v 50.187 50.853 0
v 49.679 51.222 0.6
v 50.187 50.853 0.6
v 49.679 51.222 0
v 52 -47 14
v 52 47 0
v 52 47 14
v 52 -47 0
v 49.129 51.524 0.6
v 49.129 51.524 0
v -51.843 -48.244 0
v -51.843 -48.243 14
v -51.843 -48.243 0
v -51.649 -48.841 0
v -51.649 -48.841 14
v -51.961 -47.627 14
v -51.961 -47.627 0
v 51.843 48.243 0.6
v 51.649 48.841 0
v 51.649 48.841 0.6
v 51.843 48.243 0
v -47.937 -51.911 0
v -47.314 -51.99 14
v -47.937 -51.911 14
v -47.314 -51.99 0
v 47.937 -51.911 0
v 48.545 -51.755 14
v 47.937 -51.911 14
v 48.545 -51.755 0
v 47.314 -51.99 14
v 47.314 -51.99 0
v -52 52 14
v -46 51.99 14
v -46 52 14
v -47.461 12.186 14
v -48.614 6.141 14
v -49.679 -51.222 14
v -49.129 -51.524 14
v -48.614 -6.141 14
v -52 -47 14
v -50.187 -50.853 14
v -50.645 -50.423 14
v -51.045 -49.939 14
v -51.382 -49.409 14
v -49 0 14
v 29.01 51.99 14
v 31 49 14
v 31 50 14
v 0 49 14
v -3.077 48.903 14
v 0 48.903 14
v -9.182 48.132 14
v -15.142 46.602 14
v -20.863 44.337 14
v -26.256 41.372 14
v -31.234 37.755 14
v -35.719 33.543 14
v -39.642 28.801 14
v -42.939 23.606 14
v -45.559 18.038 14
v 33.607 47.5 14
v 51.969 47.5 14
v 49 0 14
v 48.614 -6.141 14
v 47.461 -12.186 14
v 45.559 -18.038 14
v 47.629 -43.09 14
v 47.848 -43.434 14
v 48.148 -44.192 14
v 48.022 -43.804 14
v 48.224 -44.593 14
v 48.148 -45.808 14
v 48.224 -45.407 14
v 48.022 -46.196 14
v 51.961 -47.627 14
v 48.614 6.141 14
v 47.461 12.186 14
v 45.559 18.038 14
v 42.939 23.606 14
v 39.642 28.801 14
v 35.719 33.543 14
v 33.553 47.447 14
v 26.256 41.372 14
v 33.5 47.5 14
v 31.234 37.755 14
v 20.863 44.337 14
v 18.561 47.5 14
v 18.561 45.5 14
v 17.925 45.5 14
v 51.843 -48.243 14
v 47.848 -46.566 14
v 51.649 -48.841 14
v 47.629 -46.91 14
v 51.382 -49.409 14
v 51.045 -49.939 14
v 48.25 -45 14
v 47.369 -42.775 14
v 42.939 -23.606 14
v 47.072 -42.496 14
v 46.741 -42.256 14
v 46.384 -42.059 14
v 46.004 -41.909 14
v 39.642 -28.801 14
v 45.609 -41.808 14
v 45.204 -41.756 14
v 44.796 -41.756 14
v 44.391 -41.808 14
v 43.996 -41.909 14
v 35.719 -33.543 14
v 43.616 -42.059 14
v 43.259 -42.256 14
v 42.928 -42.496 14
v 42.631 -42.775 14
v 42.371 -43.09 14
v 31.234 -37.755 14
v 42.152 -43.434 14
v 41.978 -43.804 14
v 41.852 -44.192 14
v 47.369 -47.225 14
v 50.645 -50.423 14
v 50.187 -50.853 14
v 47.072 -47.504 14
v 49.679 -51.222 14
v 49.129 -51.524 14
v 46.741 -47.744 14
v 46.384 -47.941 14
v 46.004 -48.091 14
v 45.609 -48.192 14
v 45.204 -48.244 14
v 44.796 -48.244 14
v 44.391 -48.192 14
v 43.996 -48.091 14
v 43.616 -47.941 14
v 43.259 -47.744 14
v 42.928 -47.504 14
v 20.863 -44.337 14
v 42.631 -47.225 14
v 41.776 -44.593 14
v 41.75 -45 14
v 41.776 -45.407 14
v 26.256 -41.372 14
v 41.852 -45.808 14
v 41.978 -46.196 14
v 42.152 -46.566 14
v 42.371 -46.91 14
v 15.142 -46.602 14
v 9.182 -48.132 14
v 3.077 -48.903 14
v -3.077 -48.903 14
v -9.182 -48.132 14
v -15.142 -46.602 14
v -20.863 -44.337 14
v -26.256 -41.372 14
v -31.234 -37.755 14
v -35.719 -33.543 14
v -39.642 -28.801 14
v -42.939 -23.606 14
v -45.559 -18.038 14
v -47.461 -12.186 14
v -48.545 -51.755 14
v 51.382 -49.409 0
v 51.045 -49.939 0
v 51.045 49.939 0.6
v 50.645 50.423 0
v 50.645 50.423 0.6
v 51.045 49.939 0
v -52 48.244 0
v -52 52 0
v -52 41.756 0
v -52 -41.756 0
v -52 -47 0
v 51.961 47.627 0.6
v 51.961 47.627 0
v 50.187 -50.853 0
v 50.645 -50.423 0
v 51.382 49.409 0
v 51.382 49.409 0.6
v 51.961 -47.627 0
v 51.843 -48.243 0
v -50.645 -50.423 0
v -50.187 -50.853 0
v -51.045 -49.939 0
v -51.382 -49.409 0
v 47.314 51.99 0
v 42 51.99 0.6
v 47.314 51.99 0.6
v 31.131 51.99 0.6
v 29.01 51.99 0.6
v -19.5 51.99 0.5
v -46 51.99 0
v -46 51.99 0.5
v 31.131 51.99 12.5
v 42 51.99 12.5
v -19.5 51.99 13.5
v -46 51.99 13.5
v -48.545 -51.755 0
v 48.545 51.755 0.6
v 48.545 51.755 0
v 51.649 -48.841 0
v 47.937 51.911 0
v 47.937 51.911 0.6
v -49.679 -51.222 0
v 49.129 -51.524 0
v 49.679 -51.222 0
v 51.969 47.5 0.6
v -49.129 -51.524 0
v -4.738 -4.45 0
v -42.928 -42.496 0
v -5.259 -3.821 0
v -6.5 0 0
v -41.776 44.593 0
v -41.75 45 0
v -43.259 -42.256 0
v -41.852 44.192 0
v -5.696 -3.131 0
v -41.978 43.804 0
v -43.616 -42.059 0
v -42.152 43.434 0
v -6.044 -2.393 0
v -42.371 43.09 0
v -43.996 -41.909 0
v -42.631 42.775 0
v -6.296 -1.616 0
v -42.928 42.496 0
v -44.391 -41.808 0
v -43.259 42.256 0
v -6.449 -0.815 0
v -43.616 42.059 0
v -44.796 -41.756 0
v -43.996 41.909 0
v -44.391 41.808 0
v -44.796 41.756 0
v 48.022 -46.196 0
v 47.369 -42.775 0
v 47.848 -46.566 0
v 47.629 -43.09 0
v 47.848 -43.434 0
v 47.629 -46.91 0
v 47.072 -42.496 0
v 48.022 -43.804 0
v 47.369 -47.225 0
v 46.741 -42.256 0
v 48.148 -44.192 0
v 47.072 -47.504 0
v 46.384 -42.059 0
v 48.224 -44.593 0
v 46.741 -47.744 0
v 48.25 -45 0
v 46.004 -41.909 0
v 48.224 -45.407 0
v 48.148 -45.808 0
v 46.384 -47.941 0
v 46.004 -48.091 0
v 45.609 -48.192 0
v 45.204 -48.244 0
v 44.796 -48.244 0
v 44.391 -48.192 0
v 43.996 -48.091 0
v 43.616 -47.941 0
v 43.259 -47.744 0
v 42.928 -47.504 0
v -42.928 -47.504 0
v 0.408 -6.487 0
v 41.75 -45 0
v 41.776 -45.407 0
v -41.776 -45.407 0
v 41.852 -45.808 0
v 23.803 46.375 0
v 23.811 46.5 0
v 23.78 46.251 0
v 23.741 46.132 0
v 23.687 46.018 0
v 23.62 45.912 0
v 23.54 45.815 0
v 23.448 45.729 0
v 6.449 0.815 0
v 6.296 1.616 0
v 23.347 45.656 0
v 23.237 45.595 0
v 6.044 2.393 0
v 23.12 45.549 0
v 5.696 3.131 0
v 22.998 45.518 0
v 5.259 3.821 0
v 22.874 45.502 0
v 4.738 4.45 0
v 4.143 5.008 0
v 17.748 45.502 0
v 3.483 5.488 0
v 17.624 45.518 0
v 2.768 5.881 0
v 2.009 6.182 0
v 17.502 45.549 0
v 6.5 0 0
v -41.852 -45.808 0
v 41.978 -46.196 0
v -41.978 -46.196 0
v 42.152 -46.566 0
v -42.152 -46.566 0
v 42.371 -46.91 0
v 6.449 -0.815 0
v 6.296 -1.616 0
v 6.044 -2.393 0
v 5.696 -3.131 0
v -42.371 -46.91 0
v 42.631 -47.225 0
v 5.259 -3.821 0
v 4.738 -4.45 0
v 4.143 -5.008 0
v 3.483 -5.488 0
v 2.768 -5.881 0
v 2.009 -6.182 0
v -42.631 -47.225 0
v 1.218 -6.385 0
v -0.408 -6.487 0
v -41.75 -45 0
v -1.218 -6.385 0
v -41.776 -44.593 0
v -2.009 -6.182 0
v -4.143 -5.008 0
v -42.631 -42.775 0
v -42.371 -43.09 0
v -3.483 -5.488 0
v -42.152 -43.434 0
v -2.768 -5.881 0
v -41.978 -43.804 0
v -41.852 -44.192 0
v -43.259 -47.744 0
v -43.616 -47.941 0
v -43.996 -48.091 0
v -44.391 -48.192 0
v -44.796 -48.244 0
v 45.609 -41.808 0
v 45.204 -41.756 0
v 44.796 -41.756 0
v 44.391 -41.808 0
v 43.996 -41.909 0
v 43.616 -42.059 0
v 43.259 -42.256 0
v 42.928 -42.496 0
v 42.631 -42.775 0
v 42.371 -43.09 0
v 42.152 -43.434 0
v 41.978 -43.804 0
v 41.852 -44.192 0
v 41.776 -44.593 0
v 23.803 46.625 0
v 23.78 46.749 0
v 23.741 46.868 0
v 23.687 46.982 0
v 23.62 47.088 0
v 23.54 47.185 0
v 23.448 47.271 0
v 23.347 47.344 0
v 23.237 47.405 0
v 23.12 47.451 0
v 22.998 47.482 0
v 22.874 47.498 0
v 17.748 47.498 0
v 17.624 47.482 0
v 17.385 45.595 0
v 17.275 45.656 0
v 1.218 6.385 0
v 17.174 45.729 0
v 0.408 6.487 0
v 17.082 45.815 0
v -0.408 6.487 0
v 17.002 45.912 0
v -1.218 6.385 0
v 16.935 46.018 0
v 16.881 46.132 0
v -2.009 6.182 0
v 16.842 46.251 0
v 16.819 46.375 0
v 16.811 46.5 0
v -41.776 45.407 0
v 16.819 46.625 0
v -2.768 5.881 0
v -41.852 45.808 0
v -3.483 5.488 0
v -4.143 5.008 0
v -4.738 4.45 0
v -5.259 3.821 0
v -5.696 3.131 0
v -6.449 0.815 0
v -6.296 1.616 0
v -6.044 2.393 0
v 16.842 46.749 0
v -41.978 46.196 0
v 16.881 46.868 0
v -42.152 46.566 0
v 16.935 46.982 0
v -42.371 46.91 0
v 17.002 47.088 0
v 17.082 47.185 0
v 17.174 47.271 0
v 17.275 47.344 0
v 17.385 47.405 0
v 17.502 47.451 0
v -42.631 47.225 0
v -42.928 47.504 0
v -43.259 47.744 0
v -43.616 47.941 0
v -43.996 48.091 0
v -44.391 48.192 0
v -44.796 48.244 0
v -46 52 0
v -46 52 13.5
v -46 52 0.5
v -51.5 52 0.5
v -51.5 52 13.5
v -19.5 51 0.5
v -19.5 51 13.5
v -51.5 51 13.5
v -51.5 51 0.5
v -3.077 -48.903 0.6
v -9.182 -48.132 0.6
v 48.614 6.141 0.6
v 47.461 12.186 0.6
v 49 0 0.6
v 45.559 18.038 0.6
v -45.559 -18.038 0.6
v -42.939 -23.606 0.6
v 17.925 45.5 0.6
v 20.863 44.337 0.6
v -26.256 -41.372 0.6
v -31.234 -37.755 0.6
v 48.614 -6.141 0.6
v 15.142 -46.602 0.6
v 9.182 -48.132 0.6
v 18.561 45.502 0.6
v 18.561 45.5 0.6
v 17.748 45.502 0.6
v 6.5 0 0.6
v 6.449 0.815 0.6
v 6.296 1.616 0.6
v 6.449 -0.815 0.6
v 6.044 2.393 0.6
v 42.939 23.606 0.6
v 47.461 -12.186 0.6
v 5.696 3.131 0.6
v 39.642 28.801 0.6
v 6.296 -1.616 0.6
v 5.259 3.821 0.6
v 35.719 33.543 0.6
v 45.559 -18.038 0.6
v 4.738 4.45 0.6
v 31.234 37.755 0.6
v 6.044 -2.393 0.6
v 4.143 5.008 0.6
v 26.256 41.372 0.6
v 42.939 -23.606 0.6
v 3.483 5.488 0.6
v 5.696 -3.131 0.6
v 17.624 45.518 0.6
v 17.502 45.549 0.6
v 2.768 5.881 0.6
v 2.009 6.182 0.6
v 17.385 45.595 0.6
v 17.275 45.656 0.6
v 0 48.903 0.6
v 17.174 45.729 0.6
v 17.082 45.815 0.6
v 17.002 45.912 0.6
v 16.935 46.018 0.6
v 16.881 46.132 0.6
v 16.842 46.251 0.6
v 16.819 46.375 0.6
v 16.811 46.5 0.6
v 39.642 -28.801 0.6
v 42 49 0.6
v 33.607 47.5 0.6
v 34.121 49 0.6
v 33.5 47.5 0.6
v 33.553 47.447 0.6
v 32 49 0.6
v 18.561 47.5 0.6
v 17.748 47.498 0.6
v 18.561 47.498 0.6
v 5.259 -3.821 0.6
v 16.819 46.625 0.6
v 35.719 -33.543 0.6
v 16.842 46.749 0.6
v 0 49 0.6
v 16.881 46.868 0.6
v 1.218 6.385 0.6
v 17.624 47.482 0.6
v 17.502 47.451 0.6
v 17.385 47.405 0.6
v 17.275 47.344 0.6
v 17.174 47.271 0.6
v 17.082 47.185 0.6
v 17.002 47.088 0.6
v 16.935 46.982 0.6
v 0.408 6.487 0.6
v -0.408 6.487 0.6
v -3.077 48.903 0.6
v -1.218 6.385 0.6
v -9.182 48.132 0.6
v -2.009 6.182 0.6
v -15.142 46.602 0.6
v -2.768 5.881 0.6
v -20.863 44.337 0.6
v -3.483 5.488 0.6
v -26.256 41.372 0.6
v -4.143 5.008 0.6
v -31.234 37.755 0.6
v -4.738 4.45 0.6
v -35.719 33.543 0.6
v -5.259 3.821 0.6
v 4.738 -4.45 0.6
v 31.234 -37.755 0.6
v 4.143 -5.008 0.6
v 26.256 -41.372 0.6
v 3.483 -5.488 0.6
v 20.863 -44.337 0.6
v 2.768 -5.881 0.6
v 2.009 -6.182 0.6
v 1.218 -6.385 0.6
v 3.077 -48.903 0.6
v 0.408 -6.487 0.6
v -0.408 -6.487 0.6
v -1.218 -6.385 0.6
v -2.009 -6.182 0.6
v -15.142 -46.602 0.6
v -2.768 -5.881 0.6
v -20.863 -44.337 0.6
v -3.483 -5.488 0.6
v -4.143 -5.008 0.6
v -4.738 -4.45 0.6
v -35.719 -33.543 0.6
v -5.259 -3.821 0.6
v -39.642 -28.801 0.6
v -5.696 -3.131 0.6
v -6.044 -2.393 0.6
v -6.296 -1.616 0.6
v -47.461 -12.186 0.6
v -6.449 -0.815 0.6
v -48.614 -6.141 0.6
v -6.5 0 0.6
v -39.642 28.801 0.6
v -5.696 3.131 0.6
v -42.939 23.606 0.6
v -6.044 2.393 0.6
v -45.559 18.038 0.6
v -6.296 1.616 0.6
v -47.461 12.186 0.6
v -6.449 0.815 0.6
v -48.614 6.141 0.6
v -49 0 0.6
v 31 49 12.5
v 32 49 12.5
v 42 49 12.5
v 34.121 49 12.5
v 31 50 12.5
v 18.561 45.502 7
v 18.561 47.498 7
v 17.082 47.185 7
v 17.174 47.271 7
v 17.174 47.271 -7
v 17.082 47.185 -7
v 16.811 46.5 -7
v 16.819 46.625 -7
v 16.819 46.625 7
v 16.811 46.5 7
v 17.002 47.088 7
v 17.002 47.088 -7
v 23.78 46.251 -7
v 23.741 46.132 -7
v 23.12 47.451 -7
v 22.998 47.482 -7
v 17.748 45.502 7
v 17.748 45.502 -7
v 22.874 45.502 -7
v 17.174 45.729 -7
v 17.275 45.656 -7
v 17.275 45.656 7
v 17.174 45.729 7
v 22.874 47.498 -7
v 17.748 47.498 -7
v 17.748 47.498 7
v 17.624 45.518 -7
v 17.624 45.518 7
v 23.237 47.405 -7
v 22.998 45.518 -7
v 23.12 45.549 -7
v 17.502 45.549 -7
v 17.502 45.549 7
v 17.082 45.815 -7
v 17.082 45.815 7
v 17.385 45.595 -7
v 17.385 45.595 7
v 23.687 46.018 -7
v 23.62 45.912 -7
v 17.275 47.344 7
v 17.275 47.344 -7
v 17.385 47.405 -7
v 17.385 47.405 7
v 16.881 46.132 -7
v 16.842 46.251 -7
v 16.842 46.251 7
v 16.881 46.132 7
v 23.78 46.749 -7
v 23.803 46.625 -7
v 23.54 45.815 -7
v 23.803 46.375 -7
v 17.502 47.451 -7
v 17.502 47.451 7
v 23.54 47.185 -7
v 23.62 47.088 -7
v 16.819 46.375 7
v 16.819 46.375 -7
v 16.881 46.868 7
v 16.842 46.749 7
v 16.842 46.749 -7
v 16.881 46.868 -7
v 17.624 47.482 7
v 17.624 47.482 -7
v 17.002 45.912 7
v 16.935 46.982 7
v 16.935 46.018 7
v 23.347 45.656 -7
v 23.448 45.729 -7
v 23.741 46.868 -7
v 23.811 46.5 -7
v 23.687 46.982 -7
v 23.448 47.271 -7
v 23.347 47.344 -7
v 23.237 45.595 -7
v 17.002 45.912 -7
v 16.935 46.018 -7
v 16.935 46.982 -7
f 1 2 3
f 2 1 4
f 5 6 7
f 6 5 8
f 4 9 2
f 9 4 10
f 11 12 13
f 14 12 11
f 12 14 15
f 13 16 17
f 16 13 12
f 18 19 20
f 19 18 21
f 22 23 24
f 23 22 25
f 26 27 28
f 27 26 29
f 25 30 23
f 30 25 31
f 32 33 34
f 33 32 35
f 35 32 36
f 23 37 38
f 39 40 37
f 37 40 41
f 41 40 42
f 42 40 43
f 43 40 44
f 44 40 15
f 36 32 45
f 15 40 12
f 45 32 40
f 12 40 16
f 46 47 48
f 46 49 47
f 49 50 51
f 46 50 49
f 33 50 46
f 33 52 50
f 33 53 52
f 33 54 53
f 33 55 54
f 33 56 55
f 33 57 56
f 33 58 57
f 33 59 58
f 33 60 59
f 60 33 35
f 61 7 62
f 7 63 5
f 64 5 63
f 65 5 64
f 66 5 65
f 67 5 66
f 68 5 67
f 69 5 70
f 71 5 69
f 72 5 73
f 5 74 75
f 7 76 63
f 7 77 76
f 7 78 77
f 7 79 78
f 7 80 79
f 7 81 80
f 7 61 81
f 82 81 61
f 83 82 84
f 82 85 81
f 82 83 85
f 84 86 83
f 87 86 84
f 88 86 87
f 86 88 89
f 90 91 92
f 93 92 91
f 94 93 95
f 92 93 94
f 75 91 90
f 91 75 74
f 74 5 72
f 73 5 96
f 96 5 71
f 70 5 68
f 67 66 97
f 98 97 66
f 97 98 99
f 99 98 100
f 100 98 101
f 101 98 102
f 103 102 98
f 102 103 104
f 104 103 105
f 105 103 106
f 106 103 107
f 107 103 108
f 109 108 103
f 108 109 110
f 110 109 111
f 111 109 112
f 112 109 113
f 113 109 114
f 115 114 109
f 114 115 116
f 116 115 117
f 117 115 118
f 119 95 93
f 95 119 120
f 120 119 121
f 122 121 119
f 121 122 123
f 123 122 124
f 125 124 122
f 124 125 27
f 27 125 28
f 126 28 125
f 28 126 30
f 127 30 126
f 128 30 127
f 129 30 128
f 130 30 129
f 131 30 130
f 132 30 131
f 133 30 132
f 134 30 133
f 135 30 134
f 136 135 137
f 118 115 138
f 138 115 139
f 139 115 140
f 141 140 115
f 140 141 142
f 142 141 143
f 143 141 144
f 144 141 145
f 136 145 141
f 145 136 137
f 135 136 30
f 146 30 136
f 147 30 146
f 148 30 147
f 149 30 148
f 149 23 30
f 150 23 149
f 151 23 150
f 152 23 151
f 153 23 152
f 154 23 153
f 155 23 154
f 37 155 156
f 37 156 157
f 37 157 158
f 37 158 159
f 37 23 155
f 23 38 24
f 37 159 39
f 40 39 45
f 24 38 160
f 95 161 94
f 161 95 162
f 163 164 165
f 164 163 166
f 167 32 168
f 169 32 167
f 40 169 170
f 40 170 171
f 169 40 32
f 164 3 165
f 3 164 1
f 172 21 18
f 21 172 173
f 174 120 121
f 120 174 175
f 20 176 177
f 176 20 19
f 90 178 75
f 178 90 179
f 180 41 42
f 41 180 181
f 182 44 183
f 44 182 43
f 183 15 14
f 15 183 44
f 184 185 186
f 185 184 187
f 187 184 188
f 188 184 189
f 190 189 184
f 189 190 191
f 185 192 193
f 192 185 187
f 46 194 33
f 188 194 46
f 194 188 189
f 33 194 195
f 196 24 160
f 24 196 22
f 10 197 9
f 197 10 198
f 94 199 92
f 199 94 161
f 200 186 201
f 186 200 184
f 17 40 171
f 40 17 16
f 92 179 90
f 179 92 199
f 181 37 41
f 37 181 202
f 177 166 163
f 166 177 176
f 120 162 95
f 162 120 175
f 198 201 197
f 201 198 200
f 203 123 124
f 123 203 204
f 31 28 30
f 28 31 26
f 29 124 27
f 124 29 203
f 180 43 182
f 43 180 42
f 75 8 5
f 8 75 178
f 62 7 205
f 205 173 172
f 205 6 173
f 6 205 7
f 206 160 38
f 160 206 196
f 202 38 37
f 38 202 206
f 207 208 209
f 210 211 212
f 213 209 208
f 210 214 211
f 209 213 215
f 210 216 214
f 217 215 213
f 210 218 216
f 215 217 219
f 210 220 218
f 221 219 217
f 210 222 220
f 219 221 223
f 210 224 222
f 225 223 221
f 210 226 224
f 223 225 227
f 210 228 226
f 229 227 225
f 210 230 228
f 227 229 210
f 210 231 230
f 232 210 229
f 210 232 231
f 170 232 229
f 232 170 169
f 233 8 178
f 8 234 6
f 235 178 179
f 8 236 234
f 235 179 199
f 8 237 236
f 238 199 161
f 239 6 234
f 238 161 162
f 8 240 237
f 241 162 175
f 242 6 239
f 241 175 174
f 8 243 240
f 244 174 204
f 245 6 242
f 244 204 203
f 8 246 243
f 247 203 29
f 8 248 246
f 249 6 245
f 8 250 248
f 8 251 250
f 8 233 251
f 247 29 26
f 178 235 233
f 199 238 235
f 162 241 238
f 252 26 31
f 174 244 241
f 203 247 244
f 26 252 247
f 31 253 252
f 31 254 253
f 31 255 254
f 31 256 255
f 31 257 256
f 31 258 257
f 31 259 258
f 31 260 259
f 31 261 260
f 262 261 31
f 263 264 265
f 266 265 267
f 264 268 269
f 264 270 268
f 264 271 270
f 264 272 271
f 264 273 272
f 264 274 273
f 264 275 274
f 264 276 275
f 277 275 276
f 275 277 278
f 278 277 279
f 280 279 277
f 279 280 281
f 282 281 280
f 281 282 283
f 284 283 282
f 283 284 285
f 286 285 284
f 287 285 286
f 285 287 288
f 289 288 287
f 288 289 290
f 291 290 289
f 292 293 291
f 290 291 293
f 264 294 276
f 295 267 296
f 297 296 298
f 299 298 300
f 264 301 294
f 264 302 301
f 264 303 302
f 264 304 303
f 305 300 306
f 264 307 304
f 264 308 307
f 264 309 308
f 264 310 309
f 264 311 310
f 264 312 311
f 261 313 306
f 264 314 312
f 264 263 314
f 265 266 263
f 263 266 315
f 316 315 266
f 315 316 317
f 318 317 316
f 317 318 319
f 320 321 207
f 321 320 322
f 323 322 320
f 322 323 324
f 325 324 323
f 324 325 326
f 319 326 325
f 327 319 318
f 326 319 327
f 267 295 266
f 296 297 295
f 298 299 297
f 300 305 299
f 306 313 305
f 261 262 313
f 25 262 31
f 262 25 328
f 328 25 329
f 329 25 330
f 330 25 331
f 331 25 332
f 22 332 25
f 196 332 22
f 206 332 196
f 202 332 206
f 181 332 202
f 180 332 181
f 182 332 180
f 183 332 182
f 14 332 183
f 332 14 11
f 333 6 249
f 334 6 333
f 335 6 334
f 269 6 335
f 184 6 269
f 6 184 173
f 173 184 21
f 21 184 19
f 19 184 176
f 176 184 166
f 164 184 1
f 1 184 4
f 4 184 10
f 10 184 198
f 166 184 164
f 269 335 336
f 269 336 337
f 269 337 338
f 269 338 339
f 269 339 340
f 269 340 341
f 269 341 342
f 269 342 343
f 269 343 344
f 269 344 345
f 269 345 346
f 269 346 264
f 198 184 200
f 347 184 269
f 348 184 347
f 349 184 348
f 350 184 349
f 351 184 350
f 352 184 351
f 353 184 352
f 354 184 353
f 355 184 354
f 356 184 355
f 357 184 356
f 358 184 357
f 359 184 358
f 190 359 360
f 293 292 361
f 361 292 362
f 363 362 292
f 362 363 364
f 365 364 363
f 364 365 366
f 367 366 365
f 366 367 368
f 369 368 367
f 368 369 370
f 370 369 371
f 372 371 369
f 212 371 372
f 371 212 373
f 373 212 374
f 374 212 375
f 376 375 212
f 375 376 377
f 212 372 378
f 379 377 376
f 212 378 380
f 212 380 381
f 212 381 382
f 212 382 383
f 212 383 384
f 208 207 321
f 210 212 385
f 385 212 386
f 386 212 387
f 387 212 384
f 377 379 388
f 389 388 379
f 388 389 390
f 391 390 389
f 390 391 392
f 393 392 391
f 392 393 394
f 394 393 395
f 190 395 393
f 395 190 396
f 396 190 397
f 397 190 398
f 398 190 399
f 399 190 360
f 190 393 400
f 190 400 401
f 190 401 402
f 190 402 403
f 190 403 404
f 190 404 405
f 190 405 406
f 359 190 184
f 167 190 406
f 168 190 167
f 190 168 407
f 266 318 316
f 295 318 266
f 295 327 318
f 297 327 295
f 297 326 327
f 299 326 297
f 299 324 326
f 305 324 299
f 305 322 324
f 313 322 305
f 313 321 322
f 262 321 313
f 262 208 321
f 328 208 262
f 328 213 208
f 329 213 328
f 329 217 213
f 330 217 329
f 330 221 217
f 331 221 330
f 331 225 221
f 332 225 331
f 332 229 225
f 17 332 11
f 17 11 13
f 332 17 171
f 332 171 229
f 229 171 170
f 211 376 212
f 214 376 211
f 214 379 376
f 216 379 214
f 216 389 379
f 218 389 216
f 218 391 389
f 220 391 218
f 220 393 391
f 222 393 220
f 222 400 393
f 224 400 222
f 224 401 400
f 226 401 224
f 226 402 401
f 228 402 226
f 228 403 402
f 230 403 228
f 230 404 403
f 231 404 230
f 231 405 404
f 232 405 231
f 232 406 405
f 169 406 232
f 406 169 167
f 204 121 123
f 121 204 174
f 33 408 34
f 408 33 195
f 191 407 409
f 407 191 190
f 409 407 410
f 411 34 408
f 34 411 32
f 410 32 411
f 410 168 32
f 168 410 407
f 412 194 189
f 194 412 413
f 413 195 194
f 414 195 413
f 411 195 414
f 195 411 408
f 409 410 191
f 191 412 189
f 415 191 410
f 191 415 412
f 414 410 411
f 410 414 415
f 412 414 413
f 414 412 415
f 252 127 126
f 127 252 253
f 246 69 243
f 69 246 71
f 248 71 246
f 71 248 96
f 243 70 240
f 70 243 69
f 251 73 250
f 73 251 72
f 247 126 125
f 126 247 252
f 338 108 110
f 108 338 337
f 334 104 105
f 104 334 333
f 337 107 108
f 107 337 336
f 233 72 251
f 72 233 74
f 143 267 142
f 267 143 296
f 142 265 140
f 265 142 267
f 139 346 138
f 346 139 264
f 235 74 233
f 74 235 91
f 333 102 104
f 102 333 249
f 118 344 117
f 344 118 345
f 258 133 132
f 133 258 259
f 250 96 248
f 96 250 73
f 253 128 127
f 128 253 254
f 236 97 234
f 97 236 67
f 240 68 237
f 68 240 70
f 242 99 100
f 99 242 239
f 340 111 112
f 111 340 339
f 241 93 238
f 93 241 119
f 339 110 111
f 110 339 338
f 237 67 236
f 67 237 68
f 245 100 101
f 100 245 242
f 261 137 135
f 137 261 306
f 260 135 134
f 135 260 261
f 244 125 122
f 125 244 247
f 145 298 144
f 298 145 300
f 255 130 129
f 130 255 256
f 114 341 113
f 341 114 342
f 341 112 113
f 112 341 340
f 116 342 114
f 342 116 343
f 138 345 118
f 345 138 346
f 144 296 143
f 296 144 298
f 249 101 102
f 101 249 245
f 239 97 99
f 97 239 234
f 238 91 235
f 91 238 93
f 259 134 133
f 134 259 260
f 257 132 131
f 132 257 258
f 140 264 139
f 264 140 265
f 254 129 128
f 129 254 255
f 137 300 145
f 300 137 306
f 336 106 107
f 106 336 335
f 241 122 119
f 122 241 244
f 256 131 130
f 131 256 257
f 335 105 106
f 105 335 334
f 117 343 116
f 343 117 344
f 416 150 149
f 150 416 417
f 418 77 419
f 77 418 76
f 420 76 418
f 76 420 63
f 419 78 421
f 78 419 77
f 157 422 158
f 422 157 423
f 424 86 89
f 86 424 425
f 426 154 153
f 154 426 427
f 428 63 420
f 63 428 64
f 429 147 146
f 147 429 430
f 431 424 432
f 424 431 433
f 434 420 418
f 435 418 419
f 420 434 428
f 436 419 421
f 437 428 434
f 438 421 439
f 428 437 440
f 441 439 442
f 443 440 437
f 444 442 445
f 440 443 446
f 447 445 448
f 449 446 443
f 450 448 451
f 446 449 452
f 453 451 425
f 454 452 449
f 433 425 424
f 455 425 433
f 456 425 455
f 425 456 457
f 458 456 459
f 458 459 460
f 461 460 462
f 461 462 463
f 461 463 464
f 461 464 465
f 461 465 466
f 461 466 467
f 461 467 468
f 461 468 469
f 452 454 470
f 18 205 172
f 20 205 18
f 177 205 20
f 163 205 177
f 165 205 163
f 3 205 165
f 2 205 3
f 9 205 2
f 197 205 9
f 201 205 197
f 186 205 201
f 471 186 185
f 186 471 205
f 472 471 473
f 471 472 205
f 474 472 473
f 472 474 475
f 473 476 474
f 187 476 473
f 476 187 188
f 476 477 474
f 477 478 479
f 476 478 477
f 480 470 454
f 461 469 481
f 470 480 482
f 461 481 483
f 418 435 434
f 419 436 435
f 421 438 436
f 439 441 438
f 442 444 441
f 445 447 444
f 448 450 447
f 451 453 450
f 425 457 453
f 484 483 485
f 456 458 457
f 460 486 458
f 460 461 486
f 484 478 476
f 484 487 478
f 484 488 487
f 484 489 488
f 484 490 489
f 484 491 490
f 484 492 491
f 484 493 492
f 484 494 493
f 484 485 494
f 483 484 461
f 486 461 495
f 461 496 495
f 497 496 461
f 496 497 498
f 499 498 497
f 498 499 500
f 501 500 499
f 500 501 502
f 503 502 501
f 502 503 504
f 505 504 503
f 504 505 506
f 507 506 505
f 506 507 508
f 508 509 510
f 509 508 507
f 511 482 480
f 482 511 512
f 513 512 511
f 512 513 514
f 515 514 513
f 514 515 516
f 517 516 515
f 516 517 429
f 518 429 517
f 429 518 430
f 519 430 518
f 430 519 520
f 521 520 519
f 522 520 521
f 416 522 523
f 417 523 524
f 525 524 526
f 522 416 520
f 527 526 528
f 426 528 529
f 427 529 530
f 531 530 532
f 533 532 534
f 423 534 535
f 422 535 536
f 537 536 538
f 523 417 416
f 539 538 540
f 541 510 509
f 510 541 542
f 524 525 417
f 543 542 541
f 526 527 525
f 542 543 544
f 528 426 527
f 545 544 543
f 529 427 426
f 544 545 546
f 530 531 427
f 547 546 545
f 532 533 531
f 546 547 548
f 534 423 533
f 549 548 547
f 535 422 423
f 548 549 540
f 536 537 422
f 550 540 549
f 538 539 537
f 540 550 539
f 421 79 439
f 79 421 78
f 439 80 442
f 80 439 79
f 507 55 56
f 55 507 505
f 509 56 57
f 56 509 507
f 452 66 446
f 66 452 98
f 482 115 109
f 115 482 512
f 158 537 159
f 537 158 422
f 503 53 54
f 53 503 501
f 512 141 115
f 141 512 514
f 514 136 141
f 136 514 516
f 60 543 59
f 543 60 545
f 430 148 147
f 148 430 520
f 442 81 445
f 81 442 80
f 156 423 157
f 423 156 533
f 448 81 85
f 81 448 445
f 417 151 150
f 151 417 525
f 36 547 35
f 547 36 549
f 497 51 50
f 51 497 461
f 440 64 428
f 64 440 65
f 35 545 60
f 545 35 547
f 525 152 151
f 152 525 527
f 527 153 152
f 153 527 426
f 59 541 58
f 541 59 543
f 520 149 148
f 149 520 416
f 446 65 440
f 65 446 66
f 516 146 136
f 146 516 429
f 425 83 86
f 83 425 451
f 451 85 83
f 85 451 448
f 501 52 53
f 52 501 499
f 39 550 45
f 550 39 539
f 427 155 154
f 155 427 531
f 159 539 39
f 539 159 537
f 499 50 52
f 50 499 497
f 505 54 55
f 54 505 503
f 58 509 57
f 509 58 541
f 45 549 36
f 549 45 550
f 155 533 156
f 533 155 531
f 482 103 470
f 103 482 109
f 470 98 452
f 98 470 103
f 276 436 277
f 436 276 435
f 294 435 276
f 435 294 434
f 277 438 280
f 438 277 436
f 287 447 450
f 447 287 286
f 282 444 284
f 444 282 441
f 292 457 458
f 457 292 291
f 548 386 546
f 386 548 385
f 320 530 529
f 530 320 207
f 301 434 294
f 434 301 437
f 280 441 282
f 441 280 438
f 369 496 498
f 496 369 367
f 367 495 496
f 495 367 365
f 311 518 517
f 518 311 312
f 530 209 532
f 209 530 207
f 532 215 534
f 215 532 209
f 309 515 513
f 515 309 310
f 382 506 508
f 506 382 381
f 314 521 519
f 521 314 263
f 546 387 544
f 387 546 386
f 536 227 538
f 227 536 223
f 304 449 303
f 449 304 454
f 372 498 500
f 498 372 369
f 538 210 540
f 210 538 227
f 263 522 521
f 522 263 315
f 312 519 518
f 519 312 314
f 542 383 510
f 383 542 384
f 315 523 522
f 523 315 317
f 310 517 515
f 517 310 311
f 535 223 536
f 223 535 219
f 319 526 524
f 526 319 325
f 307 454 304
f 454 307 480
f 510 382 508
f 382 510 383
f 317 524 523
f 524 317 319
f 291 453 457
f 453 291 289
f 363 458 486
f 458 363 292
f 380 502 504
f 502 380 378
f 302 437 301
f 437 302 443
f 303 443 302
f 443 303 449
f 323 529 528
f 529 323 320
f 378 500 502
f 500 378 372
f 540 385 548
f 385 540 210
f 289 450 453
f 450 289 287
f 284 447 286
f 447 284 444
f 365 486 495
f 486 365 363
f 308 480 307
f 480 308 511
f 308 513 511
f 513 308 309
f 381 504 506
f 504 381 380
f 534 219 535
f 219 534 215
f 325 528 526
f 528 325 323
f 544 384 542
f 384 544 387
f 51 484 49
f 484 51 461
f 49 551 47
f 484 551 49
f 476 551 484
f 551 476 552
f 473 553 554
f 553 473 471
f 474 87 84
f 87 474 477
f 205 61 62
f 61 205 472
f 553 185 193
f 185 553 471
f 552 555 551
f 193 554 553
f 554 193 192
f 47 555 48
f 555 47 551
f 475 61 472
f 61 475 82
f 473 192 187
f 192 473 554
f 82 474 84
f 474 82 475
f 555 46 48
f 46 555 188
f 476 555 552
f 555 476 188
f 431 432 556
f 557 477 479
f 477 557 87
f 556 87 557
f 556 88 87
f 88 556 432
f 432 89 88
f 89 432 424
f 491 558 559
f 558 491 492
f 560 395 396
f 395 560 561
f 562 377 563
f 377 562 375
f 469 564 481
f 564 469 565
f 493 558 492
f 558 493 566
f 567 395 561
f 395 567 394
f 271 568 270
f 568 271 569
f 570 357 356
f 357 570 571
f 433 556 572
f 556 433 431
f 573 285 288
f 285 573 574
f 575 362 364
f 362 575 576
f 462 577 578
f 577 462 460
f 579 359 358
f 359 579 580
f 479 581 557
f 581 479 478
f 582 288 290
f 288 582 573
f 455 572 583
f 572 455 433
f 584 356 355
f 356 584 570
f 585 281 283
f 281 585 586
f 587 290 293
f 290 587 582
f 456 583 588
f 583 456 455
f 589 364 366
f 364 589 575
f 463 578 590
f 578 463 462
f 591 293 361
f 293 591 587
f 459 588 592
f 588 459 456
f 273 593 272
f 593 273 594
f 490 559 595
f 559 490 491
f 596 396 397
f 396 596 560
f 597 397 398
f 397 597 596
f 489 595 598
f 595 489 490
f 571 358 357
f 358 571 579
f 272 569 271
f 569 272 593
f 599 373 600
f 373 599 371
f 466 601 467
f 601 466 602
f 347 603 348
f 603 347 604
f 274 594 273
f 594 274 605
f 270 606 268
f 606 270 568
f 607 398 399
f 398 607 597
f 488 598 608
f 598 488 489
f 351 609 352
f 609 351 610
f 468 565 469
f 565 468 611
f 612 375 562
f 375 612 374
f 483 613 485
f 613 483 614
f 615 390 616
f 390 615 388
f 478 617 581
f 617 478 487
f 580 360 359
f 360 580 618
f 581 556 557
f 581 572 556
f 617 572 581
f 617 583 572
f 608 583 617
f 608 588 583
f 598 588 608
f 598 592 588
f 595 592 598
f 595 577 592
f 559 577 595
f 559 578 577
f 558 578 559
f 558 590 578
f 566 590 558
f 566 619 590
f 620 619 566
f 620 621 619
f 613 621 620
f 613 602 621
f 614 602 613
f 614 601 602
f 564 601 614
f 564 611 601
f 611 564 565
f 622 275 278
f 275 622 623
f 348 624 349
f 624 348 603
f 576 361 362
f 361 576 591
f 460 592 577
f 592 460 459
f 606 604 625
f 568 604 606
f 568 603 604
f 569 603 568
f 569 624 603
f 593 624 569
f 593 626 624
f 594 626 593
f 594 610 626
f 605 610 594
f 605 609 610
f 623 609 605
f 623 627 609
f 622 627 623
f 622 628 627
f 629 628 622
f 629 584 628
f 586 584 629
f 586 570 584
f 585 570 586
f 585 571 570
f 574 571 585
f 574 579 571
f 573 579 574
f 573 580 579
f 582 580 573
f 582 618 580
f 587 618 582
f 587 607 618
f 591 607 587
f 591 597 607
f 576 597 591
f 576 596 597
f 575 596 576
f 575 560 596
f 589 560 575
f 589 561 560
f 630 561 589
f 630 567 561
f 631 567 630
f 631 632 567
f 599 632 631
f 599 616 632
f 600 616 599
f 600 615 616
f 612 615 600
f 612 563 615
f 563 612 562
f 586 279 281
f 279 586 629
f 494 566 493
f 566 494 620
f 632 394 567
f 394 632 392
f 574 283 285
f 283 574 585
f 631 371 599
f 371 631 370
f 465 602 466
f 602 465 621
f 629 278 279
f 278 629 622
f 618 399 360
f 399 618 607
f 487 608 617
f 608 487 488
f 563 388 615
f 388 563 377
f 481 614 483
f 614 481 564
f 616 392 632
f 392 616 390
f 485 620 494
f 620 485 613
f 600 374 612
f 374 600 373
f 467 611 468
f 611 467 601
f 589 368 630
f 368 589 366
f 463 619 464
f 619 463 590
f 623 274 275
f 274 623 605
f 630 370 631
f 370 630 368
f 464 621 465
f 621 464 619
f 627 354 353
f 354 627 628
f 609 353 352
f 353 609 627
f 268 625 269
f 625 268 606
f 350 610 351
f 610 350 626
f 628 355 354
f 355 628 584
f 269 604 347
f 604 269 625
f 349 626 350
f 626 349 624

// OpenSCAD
$fn = 50;


union() {
	difference() {
		union() {
			hull() {
				translate(v = [-47.0000000000, 47.0000000000, 0]) {
					cylinder(h = 14, r = 5);
				}
				translate(v = [47.0000000000, 47.0000000000, 0]) {
					cylinder(h = 14, r = 5);
				}
				translate(v = [-47.0000000000, -47.0000000000, 0]) {
					cylinder(h = 14, r = 5);
				}
				translate(v = [47.0000000000, -47.0000000000, 0]) {
					cylinder(h = 14, r = 5);
				}
			}
			translate(v = [-52.0000000000, 46.0000000000, 0]) {
				cube(size = [6, 6, 14]);
			}
		}
		union() {
			translate(v = [-52.5000000000, -45.0000000000, -250.0000000000]) {
				rotate(a = [0, 0, 0]) {
					difference() {
						union() {
							hull() {
								translate(v = [7.5000000000, 0, 0]) {
									cylinder(h = 250, r = 3.2500000000, r1 = 3.2500000000, r2 = 3.2500000000);
								}
								translate(v = [-7.5000000000, 0, 0]) {
									cylinder(h = 250, r = 3.2500000000, r1 = 3.2500000000, r2 = 3.2500000000);
								}
							}
						}
						union();
					}
				}
			}
			translate(v = [-52.5000000000, 45.0000000000, -250.0000000000]) {
				rotate(a = [0, 0, 0]) {
					difference() {
						union() {
							hull() {
								translate(v = [7.5000000000, 0, 0]) {
									cylinder(h = 250, r = 3.2500000000, r1 = 3.2500000000, r2 = 3.2500000000);
								}
								translate(v = [-7.5000000000, 0, 0]) {
									cylinder(h = 250, r = 3.2500000000, r1 = 3.2500000000, r2 = 3.2500000000);
								}
							}
						}
						union();
					}
				}
			}
			translate(v = [-51.5000000000, 51.0000000000, 0.5000000000]) {
				cube(size = [32, 1, 13.0000000000]);
			}
			translate(v = [45.0000000000, -45.0000000000, 0]) {
				cylinder(h = 100, r = 3.2500000000);
			}
			translate(v = [0, 0, 0.6000000000]) {
				cylinder(h = 16.4000000000, r = 49.0000000000);
			}
			translate(v = [0, 0, -7.0000000000]) {
				cylinder(h = 14, r = 6.5000000000);
			}
			translate(v = [0.0000000000, 47.5000000000, 0.6000000000]) {
				cube(size = [52.0000000000, 1.5000000000, 16.4000000000]);
			}
			translate(v = [42.0000000000, 47.5000000000, 0.6000000000]) {
				cube(size = [10, 4.5000000000, 16.4000000000]);
			}
			translate(v = [31.0000000000, 47.5000000000, 12.5000000000]) {
				cube(size = [21, 4.5000000000, 1.5000000000]);
			}
			translate(v = [28.2500000000, 52.7500000000, 0.6000000000]) {
				rotate(a = [0, 0, -45]) {
					cube(size = [7.5000000000, 1.5000000000, 16.4000000000]);
				}
			}
			translate(v = [11.0610000000, 45.5000000000, 0.6000000000]) {
				cube(size = [7.5000000000, 2, 13.4000000000]);
			}
		}
	}
	union() {
		translate(v = [20.3110000000, 46.5000000000, -7.0000000000]) {
			rotate(a = [0, 0, 0]) {
				difference() {
					union() {
						#hull() {
							#translate(v = [2.5000000000, 0, 0]) {
								cylinder(h = 14, r = 1.0000000000, r1 = 1.0000000000, r2 = 1.0000000000);
							}
							#translate(v = [-2.5000000000, 0, 0]) {
								cylinder(h = 14, r = 1.0000000000, r1 = 1.0000000000, r2 = 1.0000000000);
							}
						}
					}
					union();
				}
			}
		}
	}
}
